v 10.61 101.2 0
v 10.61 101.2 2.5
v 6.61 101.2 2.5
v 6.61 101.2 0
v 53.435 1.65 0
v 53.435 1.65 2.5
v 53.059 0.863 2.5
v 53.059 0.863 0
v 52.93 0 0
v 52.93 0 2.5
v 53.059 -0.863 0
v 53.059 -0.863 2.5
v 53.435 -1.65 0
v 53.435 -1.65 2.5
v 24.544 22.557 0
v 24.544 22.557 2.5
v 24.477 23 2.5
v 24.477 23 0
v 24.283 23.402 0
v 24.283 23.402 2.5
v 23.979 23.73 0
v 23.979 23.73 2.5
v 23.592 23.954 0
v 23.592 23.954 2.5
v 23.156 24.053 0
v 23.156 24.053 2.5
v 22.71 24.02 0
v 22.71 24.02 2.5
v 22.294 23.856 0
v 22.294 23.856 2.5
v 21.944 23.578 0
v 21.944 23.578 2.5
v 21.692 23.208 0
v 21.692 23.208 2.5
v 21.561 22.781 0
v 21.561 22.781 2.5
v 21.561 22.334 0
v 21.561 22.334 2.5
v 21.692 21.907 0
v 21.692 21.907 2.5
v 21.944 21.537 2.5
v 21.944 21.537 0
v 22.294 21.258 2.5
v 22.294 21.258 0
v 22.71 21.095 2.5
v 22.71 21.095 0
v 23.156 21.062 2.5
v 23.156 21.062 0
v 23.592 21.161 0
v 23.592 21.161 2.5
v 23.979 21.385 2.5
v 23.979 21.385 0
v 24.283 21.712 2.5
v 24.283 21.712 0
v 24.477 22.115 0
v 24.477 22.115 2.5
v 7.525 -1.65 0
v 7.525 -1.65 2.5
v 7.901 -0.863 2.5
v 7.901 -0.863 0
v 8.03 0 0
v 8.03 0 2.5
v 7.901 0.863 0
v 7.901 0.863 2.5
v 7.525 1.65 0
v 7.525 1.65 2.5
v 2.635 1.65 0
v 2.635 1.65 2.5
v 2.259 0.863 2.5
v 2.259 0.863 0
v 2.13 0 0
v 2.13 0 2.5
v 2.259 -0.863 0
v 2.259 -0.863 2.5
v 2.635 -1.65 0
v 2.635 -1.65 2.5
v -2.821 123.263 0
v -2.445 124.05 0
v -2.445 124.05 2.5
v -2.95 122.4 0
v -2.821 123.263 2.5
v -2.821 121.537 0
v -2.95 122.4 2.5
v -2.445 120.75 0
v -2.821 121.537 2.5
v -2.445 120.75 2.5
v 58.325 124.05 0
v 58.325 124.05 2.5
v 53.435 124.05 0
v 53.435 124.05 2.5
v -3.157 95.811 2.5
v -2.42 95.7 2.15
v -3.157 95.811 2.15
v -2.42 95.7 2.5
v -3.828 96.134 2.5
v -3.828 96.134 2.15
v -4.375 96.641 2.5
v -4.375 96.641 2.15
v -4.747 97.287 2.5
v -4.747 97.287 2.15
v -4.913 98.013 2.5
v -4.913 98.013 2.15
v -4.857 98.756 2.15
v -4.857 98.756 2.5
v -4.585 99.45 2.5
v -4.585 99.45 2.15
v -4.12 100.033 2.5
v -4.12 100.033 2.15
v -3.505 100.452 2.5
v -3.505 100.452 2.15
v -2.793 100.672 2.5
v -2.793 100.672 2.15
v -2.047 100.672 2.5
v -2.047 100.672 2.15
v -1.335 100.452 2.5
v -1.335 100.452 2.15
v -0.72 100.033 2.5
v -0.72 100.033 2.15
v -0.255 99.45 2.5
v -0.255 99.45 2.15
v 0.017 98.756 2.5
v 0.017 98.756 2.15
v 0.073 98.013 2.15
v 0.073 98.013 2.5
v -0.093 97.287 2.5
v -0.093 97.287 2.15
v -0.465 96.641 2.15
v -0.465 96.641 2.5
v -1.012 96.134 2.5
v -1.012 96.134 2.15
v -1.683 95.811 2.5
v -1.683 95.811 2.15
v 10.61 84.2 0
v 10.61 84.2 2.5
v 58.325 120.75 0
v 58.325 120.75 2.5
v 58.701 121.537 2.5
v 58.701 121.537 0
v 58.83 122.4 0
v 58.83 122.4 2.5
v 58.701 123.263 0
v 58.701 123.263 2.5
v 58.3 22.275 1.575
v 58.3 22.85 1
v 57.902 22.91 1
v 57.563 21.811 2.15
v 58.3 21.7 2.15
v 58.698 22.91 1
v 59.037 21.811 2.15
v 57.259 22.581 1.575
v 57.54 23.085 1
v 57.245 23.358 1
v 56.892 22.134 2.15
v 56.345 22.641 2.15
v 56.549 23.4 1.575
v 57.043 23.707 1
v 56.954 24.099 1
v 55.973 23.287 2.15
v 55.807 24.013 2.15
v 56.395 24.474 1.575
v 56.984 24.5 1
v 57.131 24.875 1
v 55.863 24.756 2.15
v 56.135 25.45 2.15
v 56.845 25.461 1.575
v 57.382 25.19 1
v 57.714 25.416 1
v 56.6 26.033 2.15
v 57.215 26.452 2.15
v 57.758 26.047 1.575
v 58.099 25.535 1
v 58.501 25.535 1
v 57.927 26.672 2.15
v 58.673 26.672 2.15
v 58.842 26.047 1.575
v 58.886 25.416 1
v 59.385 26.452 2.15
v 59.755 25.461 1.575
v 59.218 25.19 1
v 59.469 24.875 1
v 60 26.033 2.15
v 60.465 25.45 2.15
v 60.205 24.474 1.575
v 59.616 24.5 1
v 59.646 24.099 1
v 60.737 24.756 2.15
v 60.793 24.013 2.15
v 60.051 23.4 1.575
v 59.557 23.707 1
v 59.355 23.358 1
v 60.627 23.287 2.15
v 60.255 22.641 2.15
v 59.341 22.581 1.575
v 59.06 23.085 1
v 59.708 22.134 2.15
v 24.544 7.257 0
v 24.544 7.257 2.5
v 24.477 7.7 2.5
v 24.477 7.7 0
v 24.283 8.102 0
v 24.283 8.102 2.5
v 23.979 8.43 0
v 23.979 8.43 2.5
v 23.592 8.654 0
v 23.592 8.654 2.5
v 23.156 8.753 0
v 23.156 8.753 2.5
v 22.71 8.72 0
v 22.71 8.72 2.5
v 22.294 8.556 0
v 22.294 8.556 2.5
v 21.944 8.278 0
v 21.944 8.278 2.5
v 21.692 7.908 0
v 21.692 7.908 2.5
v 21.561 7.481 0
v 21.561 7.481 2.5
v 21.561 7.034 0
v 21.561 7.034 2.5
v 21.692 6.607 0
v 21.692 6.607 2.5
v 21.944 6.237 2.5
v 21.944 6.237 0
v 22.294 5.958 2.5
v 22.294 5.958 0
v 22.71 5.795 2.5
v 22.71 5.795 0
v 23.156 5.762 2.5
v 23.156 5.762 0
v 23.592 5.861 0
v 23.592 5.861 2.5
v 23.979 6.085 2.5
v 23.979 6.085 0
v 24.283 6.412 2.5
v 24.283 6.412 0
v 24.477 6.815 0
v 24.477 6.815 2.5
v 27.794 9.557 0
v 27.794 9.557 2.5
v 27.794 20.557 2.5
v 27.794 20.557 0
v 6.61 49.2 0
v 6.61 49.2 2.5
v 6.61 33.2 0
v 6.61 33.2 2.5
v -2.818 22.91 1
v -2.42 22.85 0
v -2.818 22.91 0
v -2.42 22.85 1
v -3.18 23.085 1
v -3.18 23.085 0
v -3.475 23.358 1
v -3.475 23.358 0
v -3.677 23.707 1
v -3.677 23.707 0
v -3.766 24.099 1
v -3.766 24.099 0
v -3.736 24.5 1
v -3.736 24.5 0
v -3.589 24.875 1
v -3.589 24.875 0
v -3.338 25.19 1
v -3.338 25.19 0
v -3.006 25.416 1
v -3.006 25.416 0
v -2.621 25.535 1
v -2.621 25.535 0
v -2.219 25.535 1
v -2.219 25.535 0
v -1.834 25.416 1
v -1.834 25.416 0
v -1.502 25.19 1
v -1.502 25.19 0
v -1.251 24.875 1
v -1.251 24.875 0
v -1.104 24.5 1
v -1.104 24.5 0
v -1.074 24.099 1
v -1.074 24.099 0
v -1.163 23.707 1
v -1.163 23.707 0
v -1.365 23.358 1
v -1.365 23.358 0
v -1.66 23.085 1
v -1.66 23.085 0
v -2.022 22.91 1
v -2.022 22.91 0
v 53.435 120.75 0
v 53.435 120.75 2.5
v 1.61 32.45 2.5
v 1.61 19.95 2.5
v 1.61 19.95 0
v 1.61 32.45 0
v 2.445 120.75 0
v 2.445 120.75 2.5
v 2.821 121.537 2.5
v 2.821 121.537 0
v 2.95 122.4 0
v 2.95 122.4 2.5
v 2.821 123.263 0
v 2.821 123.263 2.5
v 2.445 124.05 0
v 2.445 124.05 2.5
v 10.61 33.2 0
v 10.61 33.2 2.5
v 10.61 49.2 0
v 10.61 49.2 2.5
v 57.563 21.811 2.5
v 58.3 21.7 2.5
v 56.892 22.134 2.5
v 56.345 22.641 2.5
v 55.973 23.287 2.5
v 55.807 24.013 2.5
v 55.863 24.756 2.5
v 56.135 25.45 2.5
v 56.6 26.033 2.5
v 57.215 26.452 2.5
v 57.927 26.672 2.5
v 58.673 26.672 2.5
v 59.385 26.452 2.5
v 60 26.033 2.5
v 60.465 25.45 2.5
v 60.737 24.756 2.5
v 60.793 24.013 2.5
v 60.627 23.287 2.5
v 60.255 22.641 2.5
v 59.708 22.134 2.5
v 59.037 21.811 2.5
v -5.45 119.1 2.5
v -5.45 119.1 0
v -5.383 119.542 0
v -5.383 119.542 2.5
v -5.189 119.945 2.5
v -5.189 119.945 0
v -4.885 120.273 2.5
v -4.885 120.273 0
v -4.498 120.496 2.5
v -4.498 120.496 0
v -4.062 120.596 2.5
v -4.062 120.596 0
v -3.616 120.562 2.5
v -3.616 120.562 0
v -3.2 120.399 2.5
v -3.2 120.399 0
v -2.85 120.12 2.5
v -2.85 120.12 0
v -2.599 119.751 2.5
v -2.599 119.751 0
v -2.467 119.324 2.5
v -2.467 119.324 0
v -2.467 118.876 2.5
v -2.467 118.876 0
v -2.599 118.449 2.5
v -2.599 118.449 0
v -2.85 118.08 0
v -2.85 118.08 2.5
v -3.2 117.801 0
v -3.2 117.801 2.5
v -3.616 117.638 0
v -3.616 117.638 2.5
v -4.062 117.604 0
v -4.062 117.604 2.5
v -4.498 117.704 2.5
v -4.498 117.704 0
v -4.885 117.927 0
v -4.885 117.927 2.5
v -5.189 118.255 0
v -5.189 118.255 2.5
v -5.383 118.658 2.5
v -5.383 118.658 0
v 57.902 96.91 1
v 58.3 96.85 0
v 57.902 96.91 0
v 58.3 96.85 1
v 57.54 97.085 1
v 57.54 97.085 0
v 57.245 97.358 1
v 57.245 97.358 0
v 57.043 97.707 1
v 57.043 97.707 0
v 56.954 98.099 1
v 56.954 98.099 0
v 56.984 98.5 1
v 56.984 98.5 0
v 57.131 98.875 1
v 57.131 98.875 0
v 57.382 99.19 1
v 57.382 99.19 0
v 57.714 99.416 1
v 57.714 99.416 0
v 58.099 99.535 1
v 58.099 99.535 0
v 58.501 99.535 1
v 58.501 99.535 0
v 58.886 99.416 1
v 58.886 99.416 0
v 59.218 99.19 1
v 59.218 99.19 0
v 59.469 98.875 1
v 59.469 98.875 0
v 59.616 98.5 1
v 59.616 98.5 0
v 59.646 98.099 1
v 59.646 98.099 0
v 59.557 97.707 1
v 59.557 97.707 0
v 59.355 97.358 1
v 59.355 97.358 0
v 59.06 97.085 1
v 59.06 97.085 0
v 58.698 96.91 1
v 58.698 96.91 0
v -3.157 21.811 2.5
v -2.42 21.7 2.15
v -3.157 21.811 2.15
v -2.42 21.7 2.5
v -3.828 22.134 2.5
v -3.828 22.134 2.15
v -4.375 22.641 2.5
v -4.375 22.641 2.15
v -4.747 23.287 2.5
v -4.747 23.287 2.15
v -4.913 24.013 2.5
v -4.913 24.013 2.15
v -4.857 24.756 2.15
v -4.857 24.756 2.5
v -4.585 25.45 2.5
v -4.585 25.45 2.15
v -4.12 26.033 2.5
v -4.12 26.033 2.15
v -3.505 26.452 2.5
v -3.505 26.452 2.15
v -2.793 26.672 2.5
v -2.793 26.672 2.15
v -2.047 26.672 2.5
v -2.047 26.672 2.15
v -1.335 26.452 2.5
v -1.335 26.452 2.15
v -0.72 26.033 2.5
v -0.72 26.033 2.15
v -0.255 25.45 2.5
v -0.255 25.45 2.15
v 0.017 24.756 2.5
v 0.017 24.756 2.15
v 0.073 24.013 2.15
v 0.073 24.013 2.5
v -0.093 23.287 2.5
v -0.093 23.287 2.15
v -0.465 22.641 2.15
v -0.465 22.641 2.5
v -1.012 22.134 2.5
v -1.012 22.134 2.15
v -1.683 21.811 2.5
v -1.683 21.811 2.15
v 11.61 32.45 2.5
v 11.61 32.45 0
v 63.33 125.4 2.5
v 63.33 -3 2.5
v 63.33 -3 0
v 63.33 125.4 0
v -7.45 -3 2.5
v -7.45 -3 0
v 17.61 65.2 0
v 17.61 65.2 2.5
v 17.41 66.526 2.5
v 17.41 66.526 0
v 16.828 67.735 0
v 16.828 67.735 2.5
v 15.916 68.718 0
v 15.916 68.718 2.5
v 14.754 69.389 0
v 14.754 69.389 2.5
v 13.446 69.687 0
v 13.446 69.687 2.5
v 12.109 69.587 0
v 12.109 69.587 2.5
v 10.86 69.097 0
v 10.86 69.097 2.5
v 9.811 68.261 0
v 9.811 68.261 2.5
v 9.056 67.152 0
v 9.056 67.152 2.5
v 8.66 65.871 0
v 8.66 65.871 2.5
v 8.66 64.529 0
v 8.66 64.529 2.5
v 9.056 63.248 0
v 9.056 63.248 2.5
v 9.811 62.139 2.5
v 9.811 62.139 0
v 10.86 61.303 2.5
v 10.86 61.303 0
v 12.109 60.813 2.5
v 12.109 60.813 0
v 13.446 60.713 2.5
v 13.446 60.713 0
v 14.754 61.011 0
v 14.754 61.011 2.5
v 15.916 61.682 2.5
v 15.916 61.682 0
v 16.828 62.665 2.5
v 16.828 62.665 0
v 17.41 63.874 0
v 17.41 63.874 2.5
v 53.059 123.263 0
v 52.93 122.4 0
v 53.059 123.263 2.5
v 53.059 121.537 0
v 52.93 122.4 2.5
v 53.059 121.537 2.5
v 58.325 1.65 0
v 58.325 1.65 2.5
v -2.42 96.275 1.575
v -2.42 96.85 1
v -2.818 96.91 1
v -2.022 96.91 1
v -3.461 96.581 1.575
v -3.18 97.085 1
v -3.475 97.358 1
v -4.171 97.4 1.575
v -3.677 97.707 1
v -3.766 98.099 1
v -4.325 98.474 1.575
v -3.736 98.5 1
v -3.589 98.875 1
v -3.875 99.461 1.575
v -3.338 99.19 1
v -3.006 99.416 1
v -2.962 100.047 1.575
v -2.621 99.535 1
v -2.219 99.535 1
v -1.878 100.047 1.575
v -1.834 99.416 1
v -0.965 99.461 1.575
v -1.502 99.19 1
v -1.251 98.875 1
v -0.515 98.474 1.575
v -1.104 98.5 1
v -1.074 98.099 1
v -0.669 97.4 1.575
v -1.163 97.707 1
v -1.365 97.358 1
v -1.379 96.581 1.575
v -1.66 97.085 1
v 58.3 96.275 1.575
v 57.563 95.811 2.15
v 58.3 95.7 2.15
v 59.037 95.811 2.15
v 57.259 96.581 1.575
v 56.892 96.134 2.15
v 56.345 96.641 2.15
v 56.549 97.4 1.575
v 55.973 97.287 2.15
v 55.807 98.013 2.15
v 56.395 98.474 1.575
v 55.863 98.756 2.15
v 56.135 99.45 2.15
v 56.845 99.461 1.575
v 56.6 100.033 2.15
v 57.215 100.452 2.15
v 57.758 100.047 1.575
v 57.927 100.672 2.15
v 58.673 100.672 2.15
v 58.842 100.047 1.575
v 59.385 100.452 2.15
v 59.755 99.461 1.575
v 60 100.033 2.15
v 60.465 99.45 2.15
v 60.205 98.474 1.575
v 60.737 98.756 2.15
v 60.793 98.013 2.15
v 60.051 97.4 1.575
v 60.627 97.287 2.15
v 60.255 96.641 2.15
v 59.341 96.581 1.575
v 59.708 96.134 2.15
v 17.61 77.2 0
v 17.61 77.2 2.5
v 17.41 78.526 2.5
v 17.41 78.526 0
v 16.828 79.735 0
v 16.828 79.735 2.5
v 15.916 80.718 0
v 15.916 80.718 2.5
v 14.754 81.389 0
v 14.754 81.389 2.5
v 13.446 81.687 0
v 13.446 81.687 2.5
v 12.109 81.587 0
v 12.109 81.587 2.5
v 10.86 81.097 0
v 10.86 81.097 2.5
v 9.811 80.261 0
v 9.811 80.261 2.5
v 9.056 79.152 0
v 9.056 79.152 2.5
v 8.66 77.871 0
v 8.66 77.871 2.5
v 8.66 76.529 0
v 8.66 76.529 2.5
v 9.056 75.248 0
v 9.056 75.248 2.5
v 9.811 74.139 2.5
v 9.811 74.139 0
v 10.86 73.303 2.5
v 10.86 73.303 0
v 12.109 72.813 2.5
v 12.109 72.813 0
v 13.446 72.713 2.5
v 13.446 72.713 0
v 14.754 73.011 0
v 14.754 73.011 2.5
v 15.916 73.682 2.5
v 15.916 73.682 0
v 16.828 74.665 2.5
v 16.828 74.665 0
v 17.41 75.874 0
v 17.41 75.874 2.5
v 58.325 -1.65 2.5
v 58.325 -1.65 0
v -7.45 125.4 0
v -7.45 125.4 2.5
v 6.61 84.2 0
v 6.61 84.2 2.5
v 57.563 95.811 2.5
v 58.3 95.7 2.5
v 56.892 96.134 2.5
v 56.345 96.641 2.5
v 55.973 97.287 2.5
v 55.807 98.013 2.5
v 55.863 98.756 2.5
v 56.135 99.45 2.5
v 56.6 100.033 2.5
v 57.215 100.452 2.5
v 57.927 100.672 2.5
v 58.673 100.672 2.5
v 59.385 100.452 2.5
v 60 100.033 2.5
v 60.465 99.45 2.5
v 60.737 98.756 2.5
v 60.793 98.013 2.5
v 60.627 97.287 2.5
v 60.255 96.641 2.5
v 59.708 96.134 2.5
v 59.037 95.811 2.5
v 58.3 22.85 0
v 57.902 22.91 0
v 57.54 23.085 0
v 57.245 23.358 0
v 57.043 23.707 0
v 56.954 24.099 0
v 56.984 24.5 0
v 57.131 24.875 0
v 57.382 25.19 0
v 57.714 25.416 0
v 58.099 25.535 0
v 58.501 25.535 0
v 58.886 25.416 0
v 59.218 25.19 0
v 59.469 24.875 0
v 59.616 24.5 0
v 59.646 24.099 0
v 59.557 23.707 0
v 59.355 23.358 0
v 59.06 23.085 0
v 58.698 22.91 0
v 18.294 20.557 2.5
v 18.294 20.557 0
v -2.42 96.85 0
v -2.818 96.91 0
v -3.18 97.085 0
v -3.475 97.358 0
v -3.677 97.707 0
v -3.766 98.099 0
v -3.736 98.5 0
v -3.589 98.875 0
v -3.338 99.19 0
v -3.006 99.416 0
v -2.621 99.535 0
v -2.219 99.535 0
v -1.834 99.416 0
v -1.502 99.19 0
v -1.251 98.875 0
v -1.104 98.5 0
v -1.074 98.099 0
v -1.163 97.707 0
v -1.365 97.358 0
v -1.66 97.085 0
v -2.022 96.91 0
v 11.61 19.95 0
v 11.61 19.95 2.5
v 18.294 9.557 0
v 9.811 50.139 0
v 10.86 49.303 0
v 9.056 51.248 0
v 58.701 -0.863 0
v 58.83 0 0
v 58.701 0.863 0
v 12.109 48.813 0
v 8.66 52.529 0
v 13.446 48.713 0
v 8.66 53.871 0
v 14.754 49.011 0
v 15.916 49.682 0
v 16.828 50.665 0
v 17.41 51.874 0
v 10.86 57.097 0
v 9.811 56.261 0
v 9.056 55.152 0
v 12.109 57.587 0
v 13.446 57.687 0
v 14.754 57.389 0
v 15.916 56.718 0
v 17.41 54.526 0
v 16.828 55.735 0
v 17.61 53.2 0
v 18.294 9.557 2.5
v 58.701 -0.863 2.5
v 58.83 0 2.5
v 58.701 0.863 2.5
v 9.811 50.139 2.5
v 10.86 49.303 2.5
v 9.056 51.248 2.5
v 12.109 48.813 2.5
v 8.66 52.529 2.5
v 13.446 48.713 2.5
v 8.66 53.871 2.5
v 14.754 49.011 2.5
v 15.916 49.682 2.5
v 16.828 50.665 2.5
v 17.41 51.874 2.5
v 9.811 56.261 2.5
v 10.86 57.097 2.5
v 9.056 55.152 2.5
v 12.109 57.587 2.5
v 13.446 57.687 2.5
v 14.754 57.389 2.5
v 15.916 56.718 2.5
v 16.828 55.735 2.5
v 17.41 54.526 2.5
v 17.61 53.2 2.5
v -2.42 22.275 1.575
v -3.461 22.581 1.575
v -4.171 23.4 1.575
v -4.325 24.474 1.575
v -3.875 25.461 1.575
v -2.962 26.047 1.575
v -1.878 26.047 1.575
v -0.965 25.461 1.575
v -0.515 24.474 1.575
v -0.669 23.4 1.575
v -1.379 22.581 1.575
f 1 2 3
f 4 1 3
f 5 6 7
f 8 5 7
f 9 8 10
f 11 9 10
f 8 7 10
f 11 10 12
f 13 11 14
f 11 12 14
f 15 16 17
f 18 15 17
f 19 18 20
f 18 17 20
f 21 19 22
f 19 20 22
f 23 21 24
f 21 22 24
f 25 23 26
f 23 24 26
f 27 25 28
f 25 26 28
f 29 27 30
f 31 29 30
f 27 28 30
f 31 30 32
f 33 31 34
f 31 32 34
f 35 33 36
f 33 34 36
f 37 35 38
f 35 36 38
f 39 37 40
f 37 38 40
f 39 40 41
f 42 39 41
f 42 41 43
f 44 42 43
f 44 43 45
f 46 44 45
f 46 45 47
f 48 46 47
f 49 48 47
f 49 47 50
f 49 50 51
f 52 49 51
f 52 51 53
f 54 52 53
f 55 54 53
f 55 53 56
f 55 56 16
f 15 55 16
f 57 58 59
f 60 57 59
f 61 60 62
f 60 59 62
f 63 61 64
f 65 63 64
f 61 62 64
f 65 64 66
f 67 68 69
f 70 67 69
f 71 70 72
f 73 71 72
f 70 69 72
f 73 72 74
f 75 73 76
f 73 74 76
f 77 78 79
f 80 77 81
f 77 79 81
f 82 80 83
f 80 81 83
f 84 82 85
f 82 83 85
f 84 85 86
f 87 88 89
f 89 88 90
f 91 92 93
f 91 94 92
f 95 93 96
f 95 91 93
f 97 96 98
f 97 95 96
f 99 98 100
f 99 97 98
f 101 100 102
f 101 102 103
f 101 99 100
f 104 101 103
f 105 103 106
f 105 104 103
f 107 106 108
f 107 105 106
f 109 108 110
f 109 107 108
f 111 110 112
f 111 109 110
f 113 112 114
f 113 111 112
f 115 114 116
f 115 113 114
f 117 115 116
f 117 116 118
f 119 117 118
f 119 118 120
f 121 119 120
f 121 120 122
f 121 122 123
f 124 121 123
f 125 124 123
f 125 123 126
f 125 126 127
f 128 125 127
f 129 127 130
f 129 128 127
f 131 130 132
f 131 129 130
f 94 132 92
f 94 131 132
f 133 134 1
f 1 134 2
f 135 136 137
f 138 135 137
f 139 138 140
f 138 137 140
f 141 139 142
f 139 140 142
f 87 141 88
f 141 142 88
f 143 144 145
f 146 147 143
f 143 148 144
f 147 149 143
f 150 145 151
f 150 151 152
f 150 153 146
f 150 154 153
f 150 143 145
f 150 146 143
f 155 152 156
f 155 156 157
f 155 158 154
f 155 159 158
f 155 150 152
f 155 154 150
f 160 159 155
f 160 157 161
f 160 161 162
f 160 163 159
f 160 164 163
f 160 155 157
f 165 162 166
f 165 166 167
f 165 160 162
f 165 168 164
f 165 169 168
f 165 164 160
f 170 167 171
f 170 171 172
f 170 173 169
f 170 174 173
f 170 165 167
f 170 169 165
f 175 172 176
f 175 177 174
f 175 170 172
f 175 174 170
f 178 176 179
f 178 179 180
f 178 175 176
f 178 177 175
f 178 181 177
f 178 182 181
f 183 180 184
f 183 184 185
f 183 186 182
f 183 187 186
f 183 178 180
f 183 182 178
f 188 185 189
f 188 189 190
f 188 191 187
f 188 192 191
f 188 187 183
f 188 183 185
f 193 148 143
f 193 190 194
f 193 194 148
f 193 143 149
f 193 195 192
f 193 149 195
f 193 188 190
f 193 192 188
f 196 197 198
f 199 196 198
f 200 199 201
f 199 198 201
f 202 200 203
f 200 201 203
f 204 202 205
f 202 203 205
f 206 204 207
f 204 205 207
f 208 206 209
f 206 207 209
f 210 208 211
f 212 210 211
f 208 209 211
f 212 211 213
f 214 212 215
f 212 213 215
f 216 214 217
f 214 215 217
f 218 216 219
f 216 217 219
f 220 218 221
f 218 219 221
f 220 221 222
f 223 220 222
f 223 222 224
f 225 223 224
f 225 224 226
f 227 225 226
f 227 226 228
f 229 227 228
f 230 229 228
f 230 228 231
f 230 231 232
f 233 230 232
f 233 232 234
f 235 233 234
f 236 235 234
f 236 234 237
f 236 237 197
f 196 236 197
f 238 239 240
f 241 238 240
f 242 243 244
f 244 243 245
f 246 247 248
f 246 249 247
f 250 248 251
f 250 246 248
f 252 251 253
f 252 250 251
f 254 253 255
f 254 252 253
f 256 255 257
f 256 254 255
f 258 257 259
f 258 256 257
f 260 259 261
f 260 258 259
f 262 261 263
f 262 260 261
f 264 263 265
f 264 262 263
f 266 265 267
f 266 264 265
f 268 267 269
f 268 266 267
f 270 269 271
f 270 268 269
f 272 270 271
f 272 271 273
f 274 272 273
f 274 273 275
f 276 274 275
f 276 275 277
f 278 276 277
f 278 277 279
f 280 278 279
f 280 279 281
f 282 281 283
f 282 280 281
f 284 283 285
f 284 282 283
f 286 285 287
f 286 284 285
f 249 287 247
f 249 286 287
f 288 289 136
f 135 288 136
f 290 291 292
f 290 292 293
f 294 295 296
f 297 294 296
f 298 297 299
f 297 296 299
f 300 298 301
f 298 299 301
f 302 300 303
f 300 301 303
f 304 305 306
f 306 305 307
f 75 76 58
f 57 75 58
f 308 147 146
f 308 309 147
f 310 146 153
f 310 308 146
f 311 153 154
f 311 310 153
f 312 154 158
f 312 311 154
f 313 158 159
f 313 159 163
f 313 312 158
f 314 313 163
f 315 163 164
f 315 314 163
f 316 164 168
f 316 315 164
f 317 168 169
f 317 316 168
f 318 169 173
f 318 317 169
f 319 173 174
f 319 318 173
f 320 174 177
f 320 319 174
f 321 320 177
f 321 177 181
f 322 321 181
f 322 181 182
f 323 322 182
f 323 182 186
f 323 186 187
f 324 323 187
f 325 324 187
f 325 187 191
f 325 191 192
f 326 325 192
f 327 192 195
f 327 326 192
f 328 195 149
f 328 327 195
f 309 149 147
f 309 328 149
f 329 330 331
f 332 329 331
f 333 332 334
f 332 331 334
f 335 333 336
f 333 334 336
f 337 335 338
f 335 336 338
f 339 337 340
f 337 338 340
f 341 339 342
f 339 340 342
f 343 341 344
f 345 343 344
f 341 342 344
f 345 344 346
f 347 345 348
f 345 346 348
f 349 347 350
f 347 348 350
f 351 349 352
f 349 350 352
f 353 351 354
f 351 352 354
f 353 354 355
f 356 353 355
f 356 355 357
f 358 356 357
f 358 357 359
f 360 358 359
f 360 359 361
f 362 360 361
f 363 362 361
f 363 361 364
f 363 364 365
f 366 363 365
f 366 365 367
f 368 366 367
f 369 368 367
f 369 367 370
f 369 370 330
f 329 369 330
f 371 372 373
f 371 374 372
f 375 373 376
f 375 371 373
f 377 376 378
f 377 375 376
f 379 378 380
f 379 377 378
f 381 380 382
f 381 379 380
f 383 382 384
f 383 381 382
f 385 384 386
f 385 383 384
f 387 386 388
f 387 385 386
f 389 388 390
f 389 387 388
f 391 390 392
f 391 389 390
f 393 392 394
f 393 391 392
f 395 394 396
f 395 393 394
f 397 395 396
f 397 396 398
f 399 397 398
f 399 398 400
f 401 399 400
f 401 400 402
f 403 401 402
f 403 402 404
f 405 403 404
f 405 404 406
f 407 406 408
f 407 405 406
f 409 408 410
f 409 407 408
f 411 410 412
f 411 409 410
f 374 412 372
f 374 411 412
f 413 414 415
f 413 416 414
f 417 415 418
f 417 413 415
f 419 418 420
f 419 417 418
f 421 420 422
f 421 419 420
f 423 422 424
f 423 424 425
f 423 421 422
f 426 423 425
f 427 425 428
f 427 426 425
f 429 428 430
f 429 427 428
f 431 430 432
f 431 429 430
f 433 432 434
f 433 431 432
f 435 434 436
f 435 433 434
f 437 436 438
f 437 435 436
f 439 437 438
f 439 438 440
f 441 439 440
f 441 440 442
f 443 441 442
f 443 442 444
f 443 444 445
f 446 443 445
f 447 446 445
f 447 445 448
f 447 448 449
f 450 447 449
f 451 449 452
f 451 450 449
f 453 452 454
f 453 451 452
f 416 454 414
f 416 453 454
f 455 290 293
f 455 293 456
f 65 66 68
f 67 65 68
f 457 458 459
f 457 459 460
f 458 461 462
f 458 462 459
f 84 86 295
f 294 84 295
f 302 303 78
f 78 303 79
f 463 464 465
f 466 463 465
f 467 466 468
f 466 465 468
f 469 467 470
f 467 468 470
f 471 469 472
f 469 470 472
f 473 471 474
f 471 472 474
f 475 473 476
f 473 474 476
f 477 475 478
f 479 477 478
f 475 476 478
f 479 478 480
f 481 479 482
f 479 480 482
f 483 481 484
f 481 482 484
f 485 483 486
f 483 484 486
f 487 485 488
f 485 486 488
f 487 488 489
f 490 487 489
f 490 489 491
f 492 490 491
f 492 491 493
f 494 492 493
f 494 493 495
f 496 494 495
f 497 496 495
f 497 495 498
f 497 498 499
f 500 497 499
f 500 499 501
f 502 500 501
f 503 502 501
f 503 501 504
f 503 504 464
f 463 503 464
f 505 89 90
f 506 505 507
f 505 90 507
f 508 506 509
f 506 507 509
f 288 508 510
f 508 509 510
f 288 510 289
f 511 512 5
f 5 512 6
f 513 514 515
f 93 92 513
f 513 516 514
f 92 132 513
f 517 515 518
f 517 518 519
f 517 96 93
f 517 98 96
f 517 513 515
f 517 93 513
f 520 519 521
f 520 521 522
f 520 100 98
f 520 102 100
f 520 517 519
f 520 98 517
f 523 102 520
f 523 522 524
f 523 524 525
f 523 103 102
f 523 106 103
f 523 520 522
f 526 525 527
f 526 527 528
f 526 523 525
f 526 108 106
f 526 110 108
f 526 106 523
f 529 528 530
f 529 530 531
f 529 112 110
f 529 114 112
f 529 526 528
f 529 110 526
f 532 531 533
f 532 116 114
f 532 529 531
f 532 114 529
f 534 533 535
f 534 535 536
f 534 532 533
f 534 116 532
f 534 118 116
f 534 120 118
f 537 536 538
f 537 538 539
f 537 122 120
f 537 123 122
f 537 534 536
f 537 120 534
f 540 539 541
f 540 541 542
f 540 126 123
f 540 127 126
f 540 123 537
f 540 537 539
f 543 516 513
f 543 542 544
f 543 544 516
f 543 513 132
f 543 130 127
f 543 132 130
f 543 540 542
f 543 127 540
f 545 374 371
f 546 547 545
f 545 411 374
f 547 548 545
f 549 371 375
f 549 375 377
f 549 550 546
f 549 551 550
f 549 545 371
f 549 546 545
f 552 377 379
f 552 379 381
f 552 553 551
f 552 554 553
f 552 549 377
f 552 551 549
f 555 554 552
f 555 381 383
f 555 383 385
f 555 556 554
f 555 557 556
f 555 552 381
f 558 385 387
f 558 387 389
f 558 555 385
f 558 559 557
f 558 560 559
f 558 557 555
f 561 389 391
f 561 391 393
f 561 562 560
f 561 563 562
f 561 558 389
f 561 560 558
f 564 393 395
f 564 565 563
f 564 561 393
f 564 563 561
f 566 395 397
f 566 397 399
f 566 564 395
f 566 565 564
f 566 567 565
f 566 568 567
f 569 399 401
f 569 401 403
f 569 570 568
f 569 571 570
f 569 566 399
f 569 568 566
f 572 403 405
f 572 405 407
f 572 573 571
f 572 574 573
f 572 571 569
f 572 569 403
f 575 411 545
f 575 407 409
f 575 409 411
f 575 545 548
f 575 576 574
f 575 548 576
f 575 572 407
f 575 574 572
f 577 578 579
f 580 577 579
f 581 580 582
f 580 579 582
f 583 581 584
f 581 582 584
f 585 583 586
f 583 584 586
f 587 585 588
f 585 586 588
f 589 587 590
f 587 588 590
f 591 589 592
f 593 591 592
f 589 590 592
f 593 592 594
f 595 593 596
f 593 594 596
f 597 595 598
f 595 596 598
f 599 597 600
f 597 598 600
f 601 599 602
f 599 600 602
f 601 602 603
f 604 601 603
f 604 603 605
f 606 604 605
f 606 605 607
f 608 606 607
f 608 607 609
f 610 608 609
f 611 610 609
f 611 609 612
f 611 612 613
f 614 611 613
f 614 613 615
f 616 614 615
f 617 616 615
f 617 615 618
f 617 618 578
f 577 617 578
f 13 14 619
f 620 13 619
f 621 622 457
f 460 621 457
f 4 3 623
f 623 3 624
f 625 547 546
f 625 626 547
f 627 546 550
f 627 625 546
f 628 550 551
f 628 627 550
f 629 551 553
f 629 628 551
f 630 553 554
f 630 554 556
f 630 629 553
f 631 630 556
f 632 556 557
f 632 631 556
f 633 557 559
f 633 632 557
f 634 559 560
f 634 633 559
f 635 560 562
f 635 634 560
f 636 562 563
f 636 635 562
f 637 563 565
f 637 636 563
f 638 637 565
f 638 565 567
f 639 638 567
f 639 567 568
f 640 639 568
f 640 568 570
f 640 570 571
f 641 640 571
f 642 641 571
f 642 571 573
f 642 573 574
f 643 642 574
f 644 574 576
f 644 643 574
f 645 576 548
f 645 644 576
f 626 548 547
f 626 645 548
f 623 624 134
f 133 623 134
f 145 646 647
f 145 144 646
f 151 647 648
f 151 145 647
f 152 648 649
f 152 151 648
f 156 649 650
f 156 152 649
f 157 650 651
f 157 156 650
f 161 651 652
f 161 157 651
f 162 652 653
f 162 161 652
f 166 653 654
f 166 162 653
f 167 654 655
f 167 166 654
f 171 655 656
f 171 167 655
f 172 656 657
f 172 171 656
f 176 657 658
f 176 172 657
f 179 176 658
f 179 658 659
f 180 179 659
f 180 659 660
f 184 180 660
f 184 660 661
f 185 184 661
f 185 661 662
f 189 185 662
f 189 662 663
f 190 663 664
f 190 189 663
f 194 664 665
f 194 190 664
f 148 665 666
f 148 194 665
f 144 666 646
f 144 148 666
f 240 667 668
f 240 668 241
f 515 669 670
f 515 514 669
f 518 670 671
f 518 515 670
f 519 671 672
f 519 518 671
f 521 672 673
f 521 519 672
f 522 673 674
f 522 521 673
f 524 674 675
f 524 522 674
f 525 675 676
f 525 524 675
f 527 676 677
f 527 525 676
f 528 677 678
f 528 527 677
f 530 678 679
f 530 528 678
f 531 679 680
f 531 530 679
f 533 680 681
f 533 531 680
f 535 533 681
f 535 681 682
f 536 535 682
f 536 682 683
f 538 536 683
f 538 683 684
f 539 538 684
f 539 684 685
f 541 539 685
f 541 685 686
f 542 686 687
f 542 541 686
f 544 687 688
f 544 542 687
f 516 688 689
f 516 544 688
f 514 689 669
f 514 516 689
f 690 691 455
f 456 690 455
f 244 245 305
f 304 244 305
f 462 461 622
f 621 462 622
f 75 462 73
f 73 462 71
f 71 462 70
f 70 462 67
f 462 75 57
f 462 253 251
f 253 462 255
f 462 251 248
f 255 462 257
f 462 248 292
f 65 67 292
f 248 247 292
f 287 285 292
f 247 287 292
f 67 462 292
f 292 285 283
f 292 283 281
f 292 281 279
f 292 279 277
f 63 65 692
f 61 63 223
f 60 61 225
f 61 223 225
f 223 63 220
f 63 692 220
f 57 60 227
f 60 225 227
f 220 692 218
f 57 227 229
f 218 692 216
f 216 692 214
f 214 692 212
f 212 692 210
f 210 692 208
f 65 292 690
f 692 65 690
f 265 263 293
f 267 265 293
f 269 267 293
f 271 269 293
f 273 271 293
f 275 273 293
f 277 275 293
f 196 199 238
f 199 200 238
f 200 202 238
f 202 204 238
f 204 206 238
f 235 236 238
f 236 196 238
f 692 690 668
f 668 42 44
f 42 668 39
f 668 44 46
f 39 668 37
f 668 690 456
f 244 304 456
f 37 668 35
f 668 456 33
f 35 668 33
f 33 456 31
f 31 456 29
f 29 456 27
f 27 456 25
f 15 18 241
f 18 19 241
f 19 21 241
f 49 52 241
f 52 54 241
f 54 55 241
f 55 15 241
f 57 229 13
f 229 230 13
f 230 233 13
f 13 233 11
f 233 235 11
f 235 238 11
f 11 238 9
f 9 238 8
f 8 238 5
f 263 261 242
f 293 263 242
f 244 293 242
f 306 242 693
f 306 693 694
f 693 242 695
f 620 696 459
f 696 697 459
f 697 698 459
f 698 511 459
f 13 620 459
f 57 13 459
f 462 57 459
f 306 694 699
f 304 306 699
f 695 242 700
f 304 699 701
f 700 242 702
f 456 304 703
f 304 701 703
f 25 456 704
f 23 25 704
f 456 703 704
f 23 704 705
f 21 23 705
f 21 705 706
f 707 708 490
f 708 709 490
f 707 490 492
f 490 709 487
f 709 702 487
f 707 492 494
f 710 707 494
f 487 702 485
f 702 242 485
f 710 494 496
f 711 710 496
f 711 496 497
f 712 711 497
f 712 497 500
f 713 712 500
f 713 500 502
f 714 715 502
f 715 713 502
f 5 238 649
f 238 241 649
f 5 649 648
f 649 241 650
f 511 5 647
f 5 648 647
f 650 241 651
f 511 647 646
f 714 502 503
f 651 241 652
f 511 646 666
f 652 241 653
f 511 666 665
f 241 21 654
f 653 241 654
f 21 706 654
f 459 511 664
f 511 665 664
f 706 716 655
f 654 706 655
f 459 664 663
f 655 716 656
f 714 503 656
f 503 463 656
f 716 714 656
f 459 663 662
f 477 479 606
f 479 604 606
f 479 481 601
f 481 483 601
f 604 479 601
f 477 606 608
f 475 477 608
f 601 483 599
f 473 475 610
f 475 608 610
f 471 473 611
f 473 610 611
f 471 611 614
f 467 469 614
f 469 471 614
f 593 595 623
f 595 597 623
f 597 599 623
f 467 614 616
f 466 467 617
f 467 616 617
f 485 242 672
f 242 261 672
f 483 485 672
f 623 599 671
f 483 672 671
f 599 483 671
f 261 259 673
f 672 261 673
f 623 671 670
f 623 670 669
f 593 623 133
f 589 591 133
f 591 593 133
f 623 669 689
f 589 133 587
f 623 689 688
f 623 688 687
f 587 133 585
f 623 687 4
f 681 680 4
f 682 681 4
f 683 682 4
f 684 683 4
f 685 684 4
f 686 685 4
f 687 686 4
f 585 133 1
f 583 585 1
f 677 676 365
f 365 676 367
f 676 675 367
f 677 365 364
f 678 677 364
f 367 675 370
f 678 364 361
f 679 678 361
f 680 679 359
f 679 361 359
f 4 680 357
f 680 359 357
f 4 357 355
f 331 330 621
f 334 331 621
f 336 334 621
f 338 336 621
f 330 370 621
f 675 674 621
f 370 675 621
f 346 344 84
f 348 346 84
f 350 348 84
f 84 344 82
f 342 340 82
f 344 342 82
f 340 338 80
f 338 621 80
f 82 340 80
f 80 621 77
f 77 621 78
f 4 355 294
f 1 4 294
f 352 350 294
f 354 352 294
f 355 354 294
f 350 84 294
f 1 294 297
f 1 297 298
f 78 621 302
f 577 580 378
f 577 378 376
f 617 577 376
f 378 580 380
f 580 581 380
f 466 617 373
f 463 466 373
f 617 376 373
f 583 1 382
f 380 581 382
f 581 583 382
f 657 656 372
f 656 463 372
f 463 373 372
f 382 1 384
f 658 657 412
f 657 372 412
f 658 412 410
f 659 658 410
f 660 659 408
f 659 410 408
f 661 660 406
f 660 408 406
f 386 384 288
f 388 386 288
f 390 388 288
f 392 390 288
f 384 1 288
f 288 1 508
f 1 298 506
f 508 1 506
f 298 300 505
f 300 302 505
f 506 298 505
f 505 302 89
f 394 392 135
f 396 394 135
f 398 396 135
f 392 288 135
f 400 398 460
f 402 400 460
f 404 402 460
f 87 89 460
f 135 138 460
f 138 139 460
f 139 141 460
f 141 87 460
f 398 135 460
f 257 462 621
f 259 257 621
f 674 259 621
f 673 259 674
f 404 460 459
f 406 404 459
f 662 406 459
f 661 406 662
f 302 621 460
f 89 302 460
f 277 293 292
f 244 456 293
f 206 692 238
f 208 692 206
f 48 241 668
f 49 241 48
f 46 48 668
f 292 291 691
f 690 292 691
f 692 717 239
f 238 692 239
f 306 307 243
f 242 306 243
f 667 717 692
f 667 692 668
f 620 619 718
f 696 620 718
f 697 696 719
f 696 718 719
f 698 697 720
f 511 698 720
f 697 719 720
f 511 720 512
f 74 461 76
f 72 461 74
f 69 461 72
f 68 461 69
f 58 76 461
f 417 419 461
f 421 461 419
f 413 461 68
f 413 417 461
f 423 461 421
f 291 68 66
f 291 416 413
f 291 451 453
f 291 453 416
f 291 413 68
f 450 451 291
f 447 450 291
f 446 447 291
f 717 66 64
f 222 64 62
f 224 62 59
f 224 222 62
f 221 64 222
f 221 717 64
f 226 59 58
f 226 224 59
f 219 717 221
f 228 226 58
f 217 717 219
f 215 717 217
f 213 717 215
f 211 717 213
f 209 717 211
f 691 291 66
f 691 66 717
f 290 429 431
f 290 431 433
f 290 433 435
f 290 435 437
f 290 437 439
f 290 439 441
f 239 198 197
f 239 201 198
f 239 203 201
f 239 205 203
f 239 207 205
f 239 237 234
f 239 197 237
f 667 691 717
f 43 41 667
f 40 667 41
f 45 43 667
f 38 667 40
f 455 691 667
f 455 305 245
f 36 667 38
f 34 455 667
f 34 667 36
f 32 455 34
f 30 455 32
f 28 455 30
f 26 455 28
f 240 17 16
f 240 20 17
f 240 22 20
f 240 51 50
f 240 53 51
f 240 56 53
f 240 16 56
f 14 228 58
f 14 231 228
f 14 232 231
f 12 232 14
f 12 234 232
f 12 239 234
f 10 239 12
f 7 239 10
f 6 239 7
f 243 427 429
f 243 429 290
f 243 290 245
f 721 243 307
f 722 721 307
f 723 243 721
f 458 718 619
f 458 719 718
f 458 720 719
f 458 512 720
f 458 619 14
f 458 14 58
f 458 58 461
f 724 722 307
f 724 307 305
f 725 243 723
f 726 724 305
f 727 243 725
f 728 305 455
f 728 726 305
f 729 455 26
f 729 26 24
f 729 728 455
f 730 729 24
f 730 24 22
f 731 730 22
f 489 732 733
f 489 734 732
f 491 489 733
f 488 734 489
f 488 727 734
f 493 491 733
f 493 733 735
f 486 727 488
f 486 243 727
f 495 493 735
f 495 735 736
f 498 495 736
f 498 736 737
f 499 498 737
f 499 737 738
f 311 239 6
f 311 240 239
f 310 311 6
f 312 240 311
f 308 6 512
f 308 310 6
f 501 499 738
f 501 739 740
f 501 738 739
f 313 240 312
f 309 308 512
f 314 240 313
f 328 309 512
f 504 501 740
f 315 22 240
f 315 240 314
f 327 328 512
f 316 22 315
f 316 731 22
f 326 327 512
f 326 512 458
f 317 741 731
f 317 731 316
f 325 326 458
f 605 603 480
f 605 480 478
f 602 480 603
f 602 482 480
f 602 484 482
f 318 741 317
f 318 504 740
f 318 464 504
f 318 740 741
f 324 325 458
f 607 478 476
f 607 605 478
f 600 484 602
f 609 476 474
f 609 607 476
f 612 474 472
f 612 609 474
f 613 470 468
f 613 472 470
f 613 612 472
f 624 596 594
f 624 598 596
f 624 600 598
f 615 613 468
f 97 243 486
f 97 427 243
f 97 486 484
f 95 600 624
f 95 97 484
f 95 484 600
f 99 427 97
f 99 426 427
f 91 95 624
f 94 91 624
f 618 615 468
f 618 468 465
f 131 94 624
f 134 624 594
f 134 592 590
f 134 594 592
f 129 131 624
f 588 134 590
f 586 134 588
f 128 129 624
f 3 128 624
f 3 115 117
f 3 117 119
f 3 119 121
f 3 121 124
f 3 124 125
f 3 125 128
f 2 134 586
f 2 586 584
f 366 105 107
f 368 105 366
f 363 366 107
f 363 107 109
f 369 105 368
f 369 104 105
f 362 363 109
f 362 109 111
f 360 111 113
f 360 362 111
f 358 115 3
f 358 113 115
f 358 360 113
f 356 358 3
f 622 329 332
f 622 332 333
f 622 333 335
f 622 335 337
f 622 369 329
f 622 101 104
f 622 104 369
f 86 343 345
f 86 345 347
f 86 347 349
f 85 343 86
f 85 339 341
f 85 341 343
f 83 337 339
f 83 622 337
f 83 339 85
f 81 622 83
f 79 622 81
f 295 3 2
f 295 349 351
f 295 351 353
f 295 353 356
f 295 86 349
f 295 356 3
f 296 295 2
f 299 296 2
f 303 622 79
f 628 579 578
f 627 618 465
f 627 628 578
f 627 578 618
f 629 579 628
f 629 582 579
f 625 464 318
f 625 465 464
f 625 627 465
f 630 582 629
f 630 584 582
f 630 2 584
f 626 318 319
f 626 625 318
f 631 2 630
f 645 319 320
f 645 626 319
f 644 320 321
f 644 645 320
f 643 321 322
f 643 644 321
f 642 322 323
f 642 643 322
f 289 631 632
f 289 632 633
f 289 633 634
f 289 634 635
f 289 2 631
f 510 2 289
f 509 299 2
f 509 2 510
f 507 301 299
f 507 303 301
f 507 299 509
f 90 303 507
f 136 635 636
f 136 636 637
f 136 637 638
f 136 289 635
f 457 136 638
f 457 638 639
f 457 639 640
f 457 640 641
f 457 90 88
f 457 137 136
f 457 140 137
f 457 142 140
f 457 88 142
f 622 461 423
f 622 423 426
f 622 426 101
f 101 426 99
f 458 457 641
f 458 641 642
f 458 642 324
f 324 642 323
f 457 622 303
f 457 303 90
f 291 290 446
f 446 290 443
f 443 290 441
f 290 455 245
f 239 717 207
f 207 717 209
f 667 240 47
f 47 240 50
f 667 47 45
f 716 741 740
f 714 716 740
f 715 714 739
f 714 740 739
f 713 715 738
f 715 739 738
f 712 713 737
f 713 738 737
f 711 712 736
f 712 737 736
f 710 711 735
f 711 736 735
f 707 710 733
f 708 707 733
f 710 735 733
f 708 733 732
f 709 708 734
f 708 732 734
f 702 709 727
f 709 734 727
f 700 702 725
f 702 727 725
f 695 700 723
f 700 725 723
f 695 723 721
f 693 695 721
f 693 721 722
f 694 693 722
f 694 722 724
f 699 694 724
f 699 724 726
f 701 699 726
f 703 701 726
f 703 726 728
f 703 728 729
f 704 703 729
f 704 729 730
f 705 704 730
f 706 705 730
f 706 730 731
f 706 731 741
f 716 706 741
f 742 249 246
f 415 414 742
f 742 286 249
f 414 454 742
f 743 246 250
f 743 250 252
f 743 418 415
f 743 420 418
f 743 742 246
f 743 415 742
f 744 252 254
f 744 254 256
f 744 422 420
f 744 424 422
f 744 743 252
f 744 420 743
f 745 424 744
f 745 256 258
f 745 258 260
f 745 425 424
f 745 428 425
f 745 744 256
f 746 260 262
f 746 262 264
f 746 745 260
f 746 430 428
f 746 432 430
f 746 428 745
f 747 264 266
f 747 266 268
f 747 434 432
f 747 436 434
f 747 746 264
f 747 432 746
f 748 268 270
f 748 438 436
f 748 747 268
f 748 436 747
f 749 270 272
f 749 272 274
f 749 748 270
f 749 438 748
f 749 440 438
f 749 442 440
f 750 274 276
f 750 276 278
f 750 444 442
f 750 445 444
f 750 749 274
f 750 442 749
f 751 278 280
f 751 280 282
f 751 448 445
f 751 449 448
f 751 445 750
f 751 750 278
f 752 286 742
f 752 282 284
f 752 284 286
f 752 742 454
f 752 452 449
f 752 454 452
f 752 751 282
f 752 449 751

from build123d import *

# Parameters (mm, degrees)
SKETCH1_W                    = 70.78
SKETCH1_H                    = 128.4
BULK_DEPTH                   = 2.5
MOUNT_HOLE_NW_DEPTH          = 141.506579561
MOUNT_HOLES_NE_SE_COUNT      = 2
MOUNT_HOLES_NE_SE_PITCH      = 55.88
MOUNT_HOLES_NE_SE_COUNT_DIR2 = 2
MOUNT_HOLES_NE_SE_PITCH_DIR2 = 122.4
MOUNT_HOLE_SW_DEPTH          = 141.506579561
ALIGNMENT_HOLE_D             = 3
DRILL_HOLES_AT_2_COUNT       = 2
DRILL_HOLES_AT_2_PITCH       = 74
DRILL_HOLES_AT_3_COUNT       = 2
DRILL_HOLES_AT_3_PITCH       = 95.72313409
DRILL_HOLES_AT_4_COUNT       = 2
DRILL_HOLES_AT_4_PITCH       = 60.72
SKETCH9_W                    = 10
SKETCH9_H                    = 12.5
USB_DEPTH                    = 141.506579561
MCXX_DEPTH                   = 141.506579561
SKETCH12_R                   = 4.5
SELECTOR_1_DEPTH             = 141.506579561
COPY_SELECTOR_COUNT          = 3
COPY_SELECTOR_PITCH          = 12
MMCX_2_DEPTH                 = 141.506579561
SKETCH25_R                   = 1.5
SKETCH25_W                   = 9.5
SKETCH25_H                   = 11
BARREL_JACK_DEPTH            = 141.506579561


with BuildPart() as part:
    # Sketch1 → Bulk (new body)
    with BuildSketch(Plane.XY.offset(2.5)):
        with Locations((27.94, 61.2)):
            Rectangle(SKETCH1_W, SKETCH1_H)
    extrude(amount=-BULK_DEPTH)

    # Sketch2 → Mount hole NW (cut, through all)
    with BuildSketch(Plane.XY.offset(2.5)):
        with BuildLine():
            Line((2.445403852, 124.05), (-2.445403852, 124.05))
            ThreePointArc((-2.445403852, 124.05), (-2.95, 122.4), (-2.445403852, 120.75))
            Line((-2.445403852, 120.75), (2.445403852, 120.75))
            ThreePointArc((2.445403852, 120.75), (2.95, 122.4), (2.445403852, 124.05))
        make_face()
    mount_hole_nw = extrude(amount=-MOUNT_HOLE_NW_DEPTH, mode=Mode.SUBTRACT)

    # Mount holes NE SE: Mount hole NW 2 × 2, 1 skipped
    with Locations(*[(i * MOUNT_HOLES_NE_SE_PITCH, -j * MOUNT_HOLES_NE_SE_PITCH_DIR2, 0) for i in range(MOUNT_HOLES_NE_SE_COUNT) for j in range(MOUNT_HOLES_NE_SE_COUNT_DIR2) if (i, j) not in ((0, 0), (0, 1))]):
        add(mount_hole_nw, mode=Mode.SUBTRACT)

    # Sketch3 → Mount hole SW (cut, through all)
    with BuildSketch(Plane.XY.offset(2.5)):
        with BuildLine():
            Line((7.525403852, 1.65), (2.634596148, 1.65))
            ThreePointArc((2.634596148, 1.65), (2.13, 0), (2.634596148, -1.65))
            Line((2.634596148, -1.65), (7.525403852, -1.65))
            ThreePointArc((7.525403852, -1.65), (8.03, 0), (7.525403852, 1.65))
        make_face()
    extrude(amount=-MOUNT_HOLE_SW_DEPTH, mode=Mode.SUBTRACT)

    # Alignment hole (through all)
    with Locations(Plane.XY.offset(2.5)):
        with Locations((-3.95, 119.1)):
            Hole(ALIGNMENT_HOLE_D / 2)

    # Sketch7 → Drill holes (revolve, cut)
    with BuildSketch(Plane(origin=(-2.42, 24.2, 2.5), x_dir=(0, -1, 0), z_dir=(1, 0, 0))):
        Polygon((0, 0), (0, 2.5), (1.35, 2.5), (1.35, 1.5), (2.5, 0.35), (2.5, 0), align=None)
    drill_holes = revolve(axis=Axis((-2.42, 24.2, 8.85), (0, 0, -1)), mode=Mode.SUBTRACT)

    # Drill holes at 2: Drill holes ×2
    with Locations(*[(0, i * DRILL_HOLES_AT_2_PITCH, 0) for i in range(1, DRILL_HOLES_AT_2_COUNT)]):
        add(drill_holes, mode=Mode.SUBTRACT)

    # Drill holes at 3: Drill holes ×2
    with Locations(*[Vector(0.6343294186643587, 0.7730628620086059, 0) * (i * DRILL_HOLES_AT_3_PITCH) for i in range(1, DRILL_HOLES_AT_3_COUNT)]):
        add(drill_holes, mode=Mode.SUBTRACT)

    # Drill holes at 4: Drill holes ×2
    with Locations(*[(i * DRILL_HOLES_AT_4_PITCH, 0, 0) for i in range(1, DRILL_HOLES_AT_4_COUNT)]):
        add(drill_holes, mode=Mode.SUBTRACT)

    # Sketch9 → USB (cut, through all)
    with BuildSketch(Plane.XY.offset(2.5)):
        with Locations((6.61, 26.2)):
            Rectangle(SKETCH9_W, SKETCH9_H)
    extrude(amount=-USB_DEPTH, mode=Mode.SUBTRACT)

    # Sketch10 → MCXX (cut, through all)
    with BuildSketch(Plane.XY.offset(2.5)):
        Polygon((6.61, 49.2), (6.61, 37.2), (6.61, 33.2), (10.61, 33.2), (10.61, 37.2), (10.61, 49.2), align=None)
    extrude(amount=-MCXX_DEPTH, mode=Mode.SUBTRACT)

    # Sketch12 → Selector 1 (cut, through all)
    with BuildSketch(Plane.XY.offset(2.5)):
        with Locations((13.11, 53.2)):
            Circle(SKETCH12_R)
    selector_1 = extrude(amount=-SELECTOR_1_DEPTH, mode=Mode.SUBTRACT)

    # Copy selector: Selector 1 ×3
    with Locations(*[(0, i * COPY_SELECTOR_PITCH, 0) for i in range(1, COPY_SELECTOR_COUNT)]):
        add(selector_1, mode=Mode.SUBTRACT)

    # Sketch27 → MMCX 2 (cut, through all)
    with BuildSketch(Plane.XY.offset(2.5)):
        Polygon((6.61, 101.2), (6.61, 88.2), (6.61, 84.2), (10.61, 84.2), (10.61, 88.2), (10.61, 101.2), align=None)
    extrude(amount=-MMCX_2_DEPTH, mode=Mode.SUBTRACT)

    # Sketch25 → Barrel Jack (cut, through all)
    with BuildSketch(Plane.XY.offset(2.5)):
        with Locations((23.043898983, 22.557406324)):
            Circle(SKETCH25_R)
        with Locations((23.043898983, 7.257406324)):
            Circle(SKETCH25_R)
        with Locations((23.043898983, 15.057406324)):
            Rectangle(SKETCH25_W, SKETCH25_H)
    extrude(amount=-BARREL_JACK_DEPTH, mode=Mode.SUBTRACT)


solid = part.part
